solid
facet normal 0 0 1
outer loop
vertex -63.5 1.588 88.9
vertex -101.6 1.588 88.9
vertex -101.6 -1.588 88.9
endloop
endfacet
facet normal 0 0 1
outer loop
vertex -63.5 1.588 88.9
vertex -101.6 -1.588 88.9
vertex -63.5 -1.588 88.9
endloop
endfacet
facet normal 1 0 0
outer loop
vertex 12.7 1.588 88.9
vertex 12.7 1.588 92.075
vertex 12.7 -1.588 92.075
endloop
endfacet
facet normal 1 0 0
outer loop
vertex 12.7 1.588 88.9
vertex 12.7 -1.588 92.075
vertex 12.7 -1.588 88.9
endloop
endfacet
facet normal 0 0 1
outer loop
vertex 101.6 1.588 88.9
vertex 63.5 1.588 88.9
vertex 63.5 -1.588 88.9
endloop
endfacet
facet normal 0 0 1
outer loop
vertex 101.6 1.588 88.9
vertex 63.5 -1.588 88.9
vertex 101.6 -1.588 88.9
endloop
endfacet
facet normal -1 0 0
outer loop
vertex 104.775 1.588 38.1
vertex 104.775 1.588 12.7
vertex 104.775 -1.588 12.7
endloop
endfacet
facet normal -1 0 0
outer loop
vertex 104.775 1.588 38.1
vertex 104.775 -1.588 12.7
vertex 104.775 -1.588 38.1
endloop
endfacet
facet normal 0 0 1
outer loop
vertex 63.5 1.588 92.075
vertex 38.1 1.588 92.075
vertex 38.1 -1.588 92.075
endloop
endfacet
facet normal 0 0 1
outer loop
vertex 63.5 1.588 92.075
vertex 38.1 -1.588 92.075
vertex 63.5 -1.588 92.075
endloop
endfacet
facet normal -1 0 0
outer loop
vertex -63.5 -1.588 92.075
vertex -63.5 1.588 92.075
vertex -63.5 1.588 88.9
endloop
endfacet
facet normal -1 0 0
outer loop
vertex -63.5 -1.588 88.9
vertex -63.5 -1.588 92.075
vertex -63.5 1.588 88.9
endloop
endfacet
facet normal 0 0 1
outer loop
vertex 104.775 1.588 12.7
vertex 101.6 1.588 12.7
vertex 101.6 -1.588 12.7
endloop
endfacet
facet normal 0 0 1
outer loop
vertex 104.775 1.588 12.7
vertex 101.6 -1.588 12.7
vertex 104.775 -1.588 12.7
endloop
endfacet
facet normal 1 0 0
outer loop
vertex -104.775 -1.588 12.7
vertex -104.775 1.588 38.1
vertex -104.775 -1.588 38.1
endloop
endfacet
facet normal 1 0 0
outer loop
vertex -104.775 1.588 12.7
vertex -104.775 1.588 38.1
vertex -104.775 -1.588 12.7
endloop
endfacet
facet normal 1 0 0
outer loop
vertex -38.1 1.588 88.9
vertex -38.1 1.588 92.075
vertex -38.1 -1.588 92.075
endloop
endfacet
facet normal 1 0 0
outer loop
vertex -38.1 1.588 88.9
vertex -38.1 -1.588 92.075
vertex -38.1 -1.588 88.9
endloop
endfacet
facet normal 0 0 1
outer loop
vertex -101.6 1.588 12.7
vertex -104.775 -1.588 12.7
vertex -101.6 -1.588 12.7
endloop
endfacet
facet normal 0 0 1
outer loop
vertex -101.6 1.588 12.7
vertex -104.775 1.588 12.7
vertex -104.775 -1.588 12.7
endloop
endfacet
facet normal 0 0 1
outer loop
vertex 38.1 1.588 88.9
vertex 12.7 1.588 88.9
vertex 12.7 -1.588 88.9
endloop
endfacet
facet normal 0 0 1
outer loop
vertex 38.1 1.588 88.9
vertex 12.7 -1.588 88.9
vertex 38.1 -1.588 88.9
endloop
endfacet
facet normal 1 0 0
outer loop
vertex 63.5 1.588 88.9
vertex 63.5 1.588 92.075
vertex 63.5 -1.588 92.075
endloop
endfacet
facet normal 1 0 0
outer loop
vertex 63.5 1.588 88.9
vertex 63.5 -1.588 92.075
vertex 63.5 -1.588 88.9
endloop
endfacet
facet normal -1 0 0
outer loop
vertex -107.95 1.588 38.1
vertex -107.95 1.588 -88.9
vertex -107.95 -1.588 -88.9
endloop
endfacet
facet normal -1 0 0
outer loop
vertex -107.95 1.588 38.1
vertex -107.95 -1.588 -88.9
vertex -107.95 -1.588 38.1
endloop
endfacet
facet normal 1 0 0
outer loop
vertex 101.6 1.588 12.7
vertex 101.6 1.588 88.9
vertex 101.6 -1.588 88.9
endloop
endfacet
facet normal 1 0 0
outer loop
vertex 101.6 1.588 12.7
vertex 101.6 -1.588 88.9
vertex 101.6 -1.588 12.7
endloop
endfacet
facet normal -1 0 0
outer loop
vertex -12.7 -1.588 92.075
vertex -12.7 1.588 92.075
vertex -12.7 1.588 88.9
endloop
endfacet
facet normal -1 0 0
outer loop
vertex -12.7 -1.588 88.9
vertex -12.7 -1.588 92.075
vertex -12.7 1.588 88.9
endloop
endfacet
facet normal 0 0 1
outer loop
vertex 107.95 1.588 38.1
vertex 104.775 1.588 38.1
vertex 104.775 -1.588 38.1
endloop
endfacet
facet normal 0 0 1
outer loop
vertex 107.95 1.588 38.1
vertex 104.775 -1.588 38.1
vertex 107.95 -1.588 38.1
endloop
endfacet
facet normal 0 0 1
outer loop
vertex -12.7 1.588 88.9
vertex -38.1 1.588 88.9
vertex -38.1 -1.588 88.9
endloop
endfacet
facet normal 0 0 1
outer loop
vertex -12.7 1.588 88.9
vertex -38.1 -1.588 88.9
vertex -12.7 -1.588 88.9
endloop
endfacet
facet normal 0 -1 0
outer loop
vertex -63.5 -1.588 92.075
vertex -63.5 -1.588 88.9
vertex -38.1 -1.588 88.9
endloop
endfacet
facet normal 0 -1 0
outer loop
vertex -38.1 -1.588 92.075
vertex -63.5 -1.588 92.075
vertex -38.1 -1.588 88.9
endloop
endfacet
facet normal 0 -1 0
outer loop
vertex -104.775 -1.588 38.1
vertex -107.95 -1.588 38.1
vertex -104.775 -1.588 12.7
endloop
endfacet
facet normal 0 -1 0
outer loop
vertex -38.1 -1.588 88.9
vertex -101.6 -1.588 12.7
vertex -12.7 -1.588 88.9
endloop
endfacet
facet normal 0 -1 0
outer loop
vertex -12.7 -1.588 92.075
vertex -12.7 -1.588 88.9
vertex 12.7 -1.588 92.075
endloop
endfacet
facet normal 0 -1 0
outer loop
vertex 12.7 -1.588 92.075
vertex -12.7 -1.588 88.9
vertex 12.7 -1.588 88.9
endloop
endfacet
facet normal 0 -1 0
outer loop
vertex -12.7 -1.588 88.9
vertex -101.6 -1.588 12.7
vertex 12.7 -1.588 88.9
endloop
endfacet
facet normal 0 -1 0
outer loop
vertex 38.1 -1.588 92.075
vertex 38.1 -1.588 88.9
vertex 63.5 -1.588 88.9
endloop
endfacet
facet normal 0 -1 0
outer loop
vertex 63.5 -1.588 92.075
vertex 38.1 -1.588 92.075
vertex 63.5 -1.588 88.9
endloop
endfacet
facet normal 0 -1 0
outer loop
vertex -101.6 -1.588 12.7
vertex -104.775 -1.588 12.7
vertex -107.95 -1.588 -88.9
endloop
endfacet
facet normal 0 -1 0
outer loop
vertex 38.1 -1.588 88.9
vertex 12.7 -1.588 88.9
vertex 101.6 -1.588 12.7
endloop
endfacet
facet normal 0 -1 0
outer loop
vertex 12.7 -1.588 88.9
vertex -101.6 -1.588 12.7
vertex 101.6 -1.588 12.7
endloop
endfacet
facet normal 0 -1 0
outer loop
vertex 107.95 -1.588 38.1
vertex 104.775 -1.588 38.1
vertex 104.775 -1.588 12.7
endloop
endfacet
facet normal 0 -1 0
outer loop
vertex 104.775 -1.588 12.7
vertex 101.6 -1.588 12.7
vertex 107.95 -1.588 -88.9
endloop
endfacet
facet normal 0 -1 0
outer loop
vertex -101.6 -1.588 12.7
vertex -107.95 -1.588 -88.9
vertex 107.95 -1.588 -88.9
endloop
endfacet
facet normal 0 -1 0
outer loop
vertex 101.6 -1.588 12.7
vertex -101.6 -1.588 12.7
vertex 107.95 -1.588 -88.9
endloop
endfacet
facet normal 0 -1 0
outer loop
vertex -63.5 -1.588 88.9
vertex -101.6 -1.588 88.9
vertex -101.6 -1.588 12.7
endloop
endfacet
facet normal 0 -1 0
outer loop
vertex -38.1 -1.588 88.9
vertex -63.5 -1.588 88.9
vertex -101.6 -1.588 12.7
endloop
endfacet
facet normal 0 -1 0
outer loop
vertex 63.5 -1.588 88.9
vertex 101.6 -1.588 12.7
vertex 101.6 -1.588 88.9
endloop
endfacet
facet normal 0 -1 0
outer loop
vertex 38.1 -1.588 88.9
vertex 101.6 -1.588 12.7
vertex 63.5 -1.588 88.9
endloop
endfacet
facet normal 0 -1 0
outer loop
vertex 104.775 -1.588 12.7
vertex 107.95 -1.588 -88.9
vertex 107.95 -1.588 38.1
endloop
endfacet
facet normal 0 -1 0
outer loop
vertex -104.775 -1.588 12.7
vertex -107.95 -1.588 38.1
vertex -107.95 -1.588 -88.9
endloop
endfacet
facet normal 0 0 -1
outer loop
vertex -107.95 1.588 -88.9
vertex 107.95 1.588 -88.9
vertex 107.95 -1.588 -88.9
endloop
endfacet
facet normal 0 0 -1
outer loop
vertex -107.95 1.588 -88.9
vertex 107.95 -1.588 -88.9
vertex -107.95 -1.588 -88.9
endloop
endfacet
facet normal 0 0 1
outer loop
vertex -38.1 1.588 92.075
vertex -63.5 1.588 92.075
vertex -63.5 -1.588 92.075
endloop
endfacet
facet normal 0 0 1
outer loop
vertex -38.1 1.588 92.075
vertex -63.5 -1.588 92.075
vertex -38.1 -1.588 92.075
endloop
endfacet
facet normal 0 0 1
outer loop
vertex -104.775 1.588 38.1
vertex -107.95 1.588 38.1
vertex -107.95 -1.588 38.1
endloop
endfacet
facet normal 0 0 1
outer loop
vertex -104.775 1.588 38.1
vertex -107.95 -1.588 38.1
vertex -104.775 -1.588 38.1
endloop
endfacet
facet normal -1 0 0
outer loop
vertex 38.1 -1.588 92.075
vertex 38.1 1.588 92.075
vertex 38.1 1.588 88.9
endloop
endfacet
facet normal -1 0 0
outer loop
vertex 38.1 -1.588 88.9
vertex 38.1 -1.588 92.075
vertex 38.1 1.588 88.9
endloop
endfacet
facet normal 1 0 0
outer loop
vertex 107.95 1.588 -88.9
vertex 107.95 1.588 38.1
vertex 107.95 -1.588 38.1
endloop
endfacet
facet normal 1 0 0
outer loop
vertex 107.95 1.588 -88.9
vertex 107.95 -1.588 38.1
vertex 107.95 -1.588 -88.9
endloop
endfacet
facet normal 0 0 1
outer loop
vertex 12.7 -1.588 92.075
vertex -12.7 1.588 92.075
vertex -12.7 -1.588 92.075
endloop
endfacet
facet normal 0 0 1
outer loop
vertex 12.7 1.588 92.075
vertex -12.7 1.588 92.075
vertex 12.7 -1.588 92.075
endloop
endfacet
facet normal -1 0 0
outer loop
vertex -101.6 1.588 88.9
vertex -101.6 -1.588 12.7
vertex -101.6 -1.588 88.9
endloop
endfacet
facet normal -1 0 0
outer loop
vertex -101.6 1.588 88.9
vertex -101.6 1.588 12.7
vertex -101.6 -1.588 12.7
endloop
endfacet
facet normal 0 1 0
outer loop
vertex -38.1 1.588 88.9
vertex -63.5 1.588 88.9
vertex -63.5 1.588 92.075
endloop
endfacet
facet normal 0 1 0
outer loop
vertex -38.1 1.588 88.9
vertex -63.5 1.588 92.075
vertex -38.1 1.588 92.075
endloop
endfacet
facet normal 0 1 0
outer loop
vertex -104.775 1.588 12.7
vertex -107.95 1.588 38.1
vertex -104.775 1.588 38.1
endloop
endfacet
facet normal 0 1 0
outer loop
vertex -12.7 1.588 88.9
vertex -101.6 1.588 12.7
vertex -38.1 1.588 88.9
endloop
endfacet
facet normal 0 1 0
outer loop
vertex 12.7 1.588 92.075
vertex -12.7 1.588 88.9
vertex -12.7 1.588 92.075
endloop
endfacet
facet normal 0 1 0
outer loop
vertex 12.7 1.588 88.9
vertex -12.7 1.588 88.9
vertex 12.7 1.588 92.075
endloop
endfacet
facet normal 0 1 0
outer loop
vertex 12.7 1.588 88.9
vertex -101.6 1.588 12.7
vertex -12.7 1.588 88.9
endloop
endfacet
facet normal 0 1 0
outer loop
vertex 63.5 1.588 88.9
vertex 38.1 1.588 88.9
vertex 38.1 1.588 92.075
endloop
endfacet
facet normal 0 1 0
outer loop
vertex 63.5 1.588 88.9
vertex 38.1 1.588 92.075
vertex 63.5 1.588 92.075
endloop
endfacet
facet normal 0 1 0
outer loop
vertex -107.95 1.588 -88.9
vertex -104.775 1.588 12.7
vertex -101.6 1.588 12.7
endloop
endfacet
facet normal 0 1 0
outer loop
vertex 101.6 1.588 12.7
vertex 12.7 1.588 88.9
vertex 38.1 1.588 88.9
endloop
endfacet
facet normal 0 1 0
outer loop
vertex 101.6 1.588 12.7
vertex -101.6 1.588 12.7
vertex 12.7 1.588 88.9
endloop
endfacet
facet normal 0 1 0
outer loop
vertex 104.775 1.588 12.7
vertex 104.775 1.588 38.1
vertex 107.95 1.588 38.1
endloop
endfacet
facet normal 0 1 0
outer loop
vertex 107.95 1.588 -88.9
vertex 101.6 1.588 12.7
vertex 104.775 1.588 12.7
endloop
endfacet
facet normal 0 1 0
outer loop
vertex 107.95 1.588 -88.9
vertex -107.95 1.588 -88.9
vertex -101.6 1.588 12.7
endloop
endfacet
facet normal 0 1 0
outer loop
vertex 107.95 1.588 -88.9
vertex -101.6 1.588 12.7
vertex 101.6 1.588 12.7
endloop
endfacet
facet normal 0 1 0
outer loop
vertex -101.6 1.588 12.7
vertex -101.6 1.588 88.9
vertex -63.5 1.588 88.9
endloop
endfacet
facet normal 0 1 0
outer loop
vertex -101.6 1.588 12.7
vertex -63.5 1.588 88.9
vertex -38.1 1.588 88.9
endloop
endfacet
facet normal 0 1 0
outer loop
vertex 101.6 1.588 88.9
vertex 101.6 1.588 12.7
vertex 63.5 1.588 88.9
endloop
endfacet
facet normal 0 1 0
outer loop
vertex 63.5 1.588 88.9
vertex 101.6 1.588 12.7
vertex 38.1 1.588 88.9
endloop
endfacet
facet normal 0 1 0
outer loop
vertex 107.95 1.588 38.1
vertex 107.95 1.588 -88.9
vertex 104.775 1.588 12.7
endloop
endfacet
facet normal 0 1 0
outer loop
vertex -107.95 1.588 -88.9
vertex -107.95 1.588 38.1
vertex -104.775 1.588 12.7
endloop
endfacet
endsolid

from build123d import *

# Parameters (mm, degrees)
SKETCH1_W           = 25.4
SKETCH1_H           = 3.175
BOSS_EXTRUDE1_DEPTH = 1.5875


with BuildPart() as part:
    # Sketch1 → Boss-Extrude1 (new body, symmetric)
    with BuildSketch(Plane(origin=(0, 0, 0), x_dir=(1, 0, 0), z_dir=(0, 1, 0))):
        Polygon((-101.6, -12.7), (-101.6, -88.9), (-63.5, -88.9), (-38.1, -88.9), (-12.7, -88.9), (12.7, -88.9), (38.1, -88.9), (63.5, -88.9), (101.6, -88.9), (101.6, -12.7), (104.775, -12.7), (104.775, -38.1), (107.95, -38.1), (107.95, 88.9), (-107.95, 88.9), (-107.95, -38.1), (-104.775, -38.1), (-104.775, -12.7), align=None)
        with Locations((-50.8, -90.4875)):
            Rectangle(SKETCH1_W, SKETCH1_H)
        with Locations((0, -90.4875)):
            Rectangle(SKETCH1_W, SKETCH1_H)
        with Locations((50.8, -90.4875)):
            Rectangle(SKETCH1_W, SKETCH1_H)
    extrude(amount=BOSS_EXTRUDE1_DEPTH, both=True)


solid = part.part
